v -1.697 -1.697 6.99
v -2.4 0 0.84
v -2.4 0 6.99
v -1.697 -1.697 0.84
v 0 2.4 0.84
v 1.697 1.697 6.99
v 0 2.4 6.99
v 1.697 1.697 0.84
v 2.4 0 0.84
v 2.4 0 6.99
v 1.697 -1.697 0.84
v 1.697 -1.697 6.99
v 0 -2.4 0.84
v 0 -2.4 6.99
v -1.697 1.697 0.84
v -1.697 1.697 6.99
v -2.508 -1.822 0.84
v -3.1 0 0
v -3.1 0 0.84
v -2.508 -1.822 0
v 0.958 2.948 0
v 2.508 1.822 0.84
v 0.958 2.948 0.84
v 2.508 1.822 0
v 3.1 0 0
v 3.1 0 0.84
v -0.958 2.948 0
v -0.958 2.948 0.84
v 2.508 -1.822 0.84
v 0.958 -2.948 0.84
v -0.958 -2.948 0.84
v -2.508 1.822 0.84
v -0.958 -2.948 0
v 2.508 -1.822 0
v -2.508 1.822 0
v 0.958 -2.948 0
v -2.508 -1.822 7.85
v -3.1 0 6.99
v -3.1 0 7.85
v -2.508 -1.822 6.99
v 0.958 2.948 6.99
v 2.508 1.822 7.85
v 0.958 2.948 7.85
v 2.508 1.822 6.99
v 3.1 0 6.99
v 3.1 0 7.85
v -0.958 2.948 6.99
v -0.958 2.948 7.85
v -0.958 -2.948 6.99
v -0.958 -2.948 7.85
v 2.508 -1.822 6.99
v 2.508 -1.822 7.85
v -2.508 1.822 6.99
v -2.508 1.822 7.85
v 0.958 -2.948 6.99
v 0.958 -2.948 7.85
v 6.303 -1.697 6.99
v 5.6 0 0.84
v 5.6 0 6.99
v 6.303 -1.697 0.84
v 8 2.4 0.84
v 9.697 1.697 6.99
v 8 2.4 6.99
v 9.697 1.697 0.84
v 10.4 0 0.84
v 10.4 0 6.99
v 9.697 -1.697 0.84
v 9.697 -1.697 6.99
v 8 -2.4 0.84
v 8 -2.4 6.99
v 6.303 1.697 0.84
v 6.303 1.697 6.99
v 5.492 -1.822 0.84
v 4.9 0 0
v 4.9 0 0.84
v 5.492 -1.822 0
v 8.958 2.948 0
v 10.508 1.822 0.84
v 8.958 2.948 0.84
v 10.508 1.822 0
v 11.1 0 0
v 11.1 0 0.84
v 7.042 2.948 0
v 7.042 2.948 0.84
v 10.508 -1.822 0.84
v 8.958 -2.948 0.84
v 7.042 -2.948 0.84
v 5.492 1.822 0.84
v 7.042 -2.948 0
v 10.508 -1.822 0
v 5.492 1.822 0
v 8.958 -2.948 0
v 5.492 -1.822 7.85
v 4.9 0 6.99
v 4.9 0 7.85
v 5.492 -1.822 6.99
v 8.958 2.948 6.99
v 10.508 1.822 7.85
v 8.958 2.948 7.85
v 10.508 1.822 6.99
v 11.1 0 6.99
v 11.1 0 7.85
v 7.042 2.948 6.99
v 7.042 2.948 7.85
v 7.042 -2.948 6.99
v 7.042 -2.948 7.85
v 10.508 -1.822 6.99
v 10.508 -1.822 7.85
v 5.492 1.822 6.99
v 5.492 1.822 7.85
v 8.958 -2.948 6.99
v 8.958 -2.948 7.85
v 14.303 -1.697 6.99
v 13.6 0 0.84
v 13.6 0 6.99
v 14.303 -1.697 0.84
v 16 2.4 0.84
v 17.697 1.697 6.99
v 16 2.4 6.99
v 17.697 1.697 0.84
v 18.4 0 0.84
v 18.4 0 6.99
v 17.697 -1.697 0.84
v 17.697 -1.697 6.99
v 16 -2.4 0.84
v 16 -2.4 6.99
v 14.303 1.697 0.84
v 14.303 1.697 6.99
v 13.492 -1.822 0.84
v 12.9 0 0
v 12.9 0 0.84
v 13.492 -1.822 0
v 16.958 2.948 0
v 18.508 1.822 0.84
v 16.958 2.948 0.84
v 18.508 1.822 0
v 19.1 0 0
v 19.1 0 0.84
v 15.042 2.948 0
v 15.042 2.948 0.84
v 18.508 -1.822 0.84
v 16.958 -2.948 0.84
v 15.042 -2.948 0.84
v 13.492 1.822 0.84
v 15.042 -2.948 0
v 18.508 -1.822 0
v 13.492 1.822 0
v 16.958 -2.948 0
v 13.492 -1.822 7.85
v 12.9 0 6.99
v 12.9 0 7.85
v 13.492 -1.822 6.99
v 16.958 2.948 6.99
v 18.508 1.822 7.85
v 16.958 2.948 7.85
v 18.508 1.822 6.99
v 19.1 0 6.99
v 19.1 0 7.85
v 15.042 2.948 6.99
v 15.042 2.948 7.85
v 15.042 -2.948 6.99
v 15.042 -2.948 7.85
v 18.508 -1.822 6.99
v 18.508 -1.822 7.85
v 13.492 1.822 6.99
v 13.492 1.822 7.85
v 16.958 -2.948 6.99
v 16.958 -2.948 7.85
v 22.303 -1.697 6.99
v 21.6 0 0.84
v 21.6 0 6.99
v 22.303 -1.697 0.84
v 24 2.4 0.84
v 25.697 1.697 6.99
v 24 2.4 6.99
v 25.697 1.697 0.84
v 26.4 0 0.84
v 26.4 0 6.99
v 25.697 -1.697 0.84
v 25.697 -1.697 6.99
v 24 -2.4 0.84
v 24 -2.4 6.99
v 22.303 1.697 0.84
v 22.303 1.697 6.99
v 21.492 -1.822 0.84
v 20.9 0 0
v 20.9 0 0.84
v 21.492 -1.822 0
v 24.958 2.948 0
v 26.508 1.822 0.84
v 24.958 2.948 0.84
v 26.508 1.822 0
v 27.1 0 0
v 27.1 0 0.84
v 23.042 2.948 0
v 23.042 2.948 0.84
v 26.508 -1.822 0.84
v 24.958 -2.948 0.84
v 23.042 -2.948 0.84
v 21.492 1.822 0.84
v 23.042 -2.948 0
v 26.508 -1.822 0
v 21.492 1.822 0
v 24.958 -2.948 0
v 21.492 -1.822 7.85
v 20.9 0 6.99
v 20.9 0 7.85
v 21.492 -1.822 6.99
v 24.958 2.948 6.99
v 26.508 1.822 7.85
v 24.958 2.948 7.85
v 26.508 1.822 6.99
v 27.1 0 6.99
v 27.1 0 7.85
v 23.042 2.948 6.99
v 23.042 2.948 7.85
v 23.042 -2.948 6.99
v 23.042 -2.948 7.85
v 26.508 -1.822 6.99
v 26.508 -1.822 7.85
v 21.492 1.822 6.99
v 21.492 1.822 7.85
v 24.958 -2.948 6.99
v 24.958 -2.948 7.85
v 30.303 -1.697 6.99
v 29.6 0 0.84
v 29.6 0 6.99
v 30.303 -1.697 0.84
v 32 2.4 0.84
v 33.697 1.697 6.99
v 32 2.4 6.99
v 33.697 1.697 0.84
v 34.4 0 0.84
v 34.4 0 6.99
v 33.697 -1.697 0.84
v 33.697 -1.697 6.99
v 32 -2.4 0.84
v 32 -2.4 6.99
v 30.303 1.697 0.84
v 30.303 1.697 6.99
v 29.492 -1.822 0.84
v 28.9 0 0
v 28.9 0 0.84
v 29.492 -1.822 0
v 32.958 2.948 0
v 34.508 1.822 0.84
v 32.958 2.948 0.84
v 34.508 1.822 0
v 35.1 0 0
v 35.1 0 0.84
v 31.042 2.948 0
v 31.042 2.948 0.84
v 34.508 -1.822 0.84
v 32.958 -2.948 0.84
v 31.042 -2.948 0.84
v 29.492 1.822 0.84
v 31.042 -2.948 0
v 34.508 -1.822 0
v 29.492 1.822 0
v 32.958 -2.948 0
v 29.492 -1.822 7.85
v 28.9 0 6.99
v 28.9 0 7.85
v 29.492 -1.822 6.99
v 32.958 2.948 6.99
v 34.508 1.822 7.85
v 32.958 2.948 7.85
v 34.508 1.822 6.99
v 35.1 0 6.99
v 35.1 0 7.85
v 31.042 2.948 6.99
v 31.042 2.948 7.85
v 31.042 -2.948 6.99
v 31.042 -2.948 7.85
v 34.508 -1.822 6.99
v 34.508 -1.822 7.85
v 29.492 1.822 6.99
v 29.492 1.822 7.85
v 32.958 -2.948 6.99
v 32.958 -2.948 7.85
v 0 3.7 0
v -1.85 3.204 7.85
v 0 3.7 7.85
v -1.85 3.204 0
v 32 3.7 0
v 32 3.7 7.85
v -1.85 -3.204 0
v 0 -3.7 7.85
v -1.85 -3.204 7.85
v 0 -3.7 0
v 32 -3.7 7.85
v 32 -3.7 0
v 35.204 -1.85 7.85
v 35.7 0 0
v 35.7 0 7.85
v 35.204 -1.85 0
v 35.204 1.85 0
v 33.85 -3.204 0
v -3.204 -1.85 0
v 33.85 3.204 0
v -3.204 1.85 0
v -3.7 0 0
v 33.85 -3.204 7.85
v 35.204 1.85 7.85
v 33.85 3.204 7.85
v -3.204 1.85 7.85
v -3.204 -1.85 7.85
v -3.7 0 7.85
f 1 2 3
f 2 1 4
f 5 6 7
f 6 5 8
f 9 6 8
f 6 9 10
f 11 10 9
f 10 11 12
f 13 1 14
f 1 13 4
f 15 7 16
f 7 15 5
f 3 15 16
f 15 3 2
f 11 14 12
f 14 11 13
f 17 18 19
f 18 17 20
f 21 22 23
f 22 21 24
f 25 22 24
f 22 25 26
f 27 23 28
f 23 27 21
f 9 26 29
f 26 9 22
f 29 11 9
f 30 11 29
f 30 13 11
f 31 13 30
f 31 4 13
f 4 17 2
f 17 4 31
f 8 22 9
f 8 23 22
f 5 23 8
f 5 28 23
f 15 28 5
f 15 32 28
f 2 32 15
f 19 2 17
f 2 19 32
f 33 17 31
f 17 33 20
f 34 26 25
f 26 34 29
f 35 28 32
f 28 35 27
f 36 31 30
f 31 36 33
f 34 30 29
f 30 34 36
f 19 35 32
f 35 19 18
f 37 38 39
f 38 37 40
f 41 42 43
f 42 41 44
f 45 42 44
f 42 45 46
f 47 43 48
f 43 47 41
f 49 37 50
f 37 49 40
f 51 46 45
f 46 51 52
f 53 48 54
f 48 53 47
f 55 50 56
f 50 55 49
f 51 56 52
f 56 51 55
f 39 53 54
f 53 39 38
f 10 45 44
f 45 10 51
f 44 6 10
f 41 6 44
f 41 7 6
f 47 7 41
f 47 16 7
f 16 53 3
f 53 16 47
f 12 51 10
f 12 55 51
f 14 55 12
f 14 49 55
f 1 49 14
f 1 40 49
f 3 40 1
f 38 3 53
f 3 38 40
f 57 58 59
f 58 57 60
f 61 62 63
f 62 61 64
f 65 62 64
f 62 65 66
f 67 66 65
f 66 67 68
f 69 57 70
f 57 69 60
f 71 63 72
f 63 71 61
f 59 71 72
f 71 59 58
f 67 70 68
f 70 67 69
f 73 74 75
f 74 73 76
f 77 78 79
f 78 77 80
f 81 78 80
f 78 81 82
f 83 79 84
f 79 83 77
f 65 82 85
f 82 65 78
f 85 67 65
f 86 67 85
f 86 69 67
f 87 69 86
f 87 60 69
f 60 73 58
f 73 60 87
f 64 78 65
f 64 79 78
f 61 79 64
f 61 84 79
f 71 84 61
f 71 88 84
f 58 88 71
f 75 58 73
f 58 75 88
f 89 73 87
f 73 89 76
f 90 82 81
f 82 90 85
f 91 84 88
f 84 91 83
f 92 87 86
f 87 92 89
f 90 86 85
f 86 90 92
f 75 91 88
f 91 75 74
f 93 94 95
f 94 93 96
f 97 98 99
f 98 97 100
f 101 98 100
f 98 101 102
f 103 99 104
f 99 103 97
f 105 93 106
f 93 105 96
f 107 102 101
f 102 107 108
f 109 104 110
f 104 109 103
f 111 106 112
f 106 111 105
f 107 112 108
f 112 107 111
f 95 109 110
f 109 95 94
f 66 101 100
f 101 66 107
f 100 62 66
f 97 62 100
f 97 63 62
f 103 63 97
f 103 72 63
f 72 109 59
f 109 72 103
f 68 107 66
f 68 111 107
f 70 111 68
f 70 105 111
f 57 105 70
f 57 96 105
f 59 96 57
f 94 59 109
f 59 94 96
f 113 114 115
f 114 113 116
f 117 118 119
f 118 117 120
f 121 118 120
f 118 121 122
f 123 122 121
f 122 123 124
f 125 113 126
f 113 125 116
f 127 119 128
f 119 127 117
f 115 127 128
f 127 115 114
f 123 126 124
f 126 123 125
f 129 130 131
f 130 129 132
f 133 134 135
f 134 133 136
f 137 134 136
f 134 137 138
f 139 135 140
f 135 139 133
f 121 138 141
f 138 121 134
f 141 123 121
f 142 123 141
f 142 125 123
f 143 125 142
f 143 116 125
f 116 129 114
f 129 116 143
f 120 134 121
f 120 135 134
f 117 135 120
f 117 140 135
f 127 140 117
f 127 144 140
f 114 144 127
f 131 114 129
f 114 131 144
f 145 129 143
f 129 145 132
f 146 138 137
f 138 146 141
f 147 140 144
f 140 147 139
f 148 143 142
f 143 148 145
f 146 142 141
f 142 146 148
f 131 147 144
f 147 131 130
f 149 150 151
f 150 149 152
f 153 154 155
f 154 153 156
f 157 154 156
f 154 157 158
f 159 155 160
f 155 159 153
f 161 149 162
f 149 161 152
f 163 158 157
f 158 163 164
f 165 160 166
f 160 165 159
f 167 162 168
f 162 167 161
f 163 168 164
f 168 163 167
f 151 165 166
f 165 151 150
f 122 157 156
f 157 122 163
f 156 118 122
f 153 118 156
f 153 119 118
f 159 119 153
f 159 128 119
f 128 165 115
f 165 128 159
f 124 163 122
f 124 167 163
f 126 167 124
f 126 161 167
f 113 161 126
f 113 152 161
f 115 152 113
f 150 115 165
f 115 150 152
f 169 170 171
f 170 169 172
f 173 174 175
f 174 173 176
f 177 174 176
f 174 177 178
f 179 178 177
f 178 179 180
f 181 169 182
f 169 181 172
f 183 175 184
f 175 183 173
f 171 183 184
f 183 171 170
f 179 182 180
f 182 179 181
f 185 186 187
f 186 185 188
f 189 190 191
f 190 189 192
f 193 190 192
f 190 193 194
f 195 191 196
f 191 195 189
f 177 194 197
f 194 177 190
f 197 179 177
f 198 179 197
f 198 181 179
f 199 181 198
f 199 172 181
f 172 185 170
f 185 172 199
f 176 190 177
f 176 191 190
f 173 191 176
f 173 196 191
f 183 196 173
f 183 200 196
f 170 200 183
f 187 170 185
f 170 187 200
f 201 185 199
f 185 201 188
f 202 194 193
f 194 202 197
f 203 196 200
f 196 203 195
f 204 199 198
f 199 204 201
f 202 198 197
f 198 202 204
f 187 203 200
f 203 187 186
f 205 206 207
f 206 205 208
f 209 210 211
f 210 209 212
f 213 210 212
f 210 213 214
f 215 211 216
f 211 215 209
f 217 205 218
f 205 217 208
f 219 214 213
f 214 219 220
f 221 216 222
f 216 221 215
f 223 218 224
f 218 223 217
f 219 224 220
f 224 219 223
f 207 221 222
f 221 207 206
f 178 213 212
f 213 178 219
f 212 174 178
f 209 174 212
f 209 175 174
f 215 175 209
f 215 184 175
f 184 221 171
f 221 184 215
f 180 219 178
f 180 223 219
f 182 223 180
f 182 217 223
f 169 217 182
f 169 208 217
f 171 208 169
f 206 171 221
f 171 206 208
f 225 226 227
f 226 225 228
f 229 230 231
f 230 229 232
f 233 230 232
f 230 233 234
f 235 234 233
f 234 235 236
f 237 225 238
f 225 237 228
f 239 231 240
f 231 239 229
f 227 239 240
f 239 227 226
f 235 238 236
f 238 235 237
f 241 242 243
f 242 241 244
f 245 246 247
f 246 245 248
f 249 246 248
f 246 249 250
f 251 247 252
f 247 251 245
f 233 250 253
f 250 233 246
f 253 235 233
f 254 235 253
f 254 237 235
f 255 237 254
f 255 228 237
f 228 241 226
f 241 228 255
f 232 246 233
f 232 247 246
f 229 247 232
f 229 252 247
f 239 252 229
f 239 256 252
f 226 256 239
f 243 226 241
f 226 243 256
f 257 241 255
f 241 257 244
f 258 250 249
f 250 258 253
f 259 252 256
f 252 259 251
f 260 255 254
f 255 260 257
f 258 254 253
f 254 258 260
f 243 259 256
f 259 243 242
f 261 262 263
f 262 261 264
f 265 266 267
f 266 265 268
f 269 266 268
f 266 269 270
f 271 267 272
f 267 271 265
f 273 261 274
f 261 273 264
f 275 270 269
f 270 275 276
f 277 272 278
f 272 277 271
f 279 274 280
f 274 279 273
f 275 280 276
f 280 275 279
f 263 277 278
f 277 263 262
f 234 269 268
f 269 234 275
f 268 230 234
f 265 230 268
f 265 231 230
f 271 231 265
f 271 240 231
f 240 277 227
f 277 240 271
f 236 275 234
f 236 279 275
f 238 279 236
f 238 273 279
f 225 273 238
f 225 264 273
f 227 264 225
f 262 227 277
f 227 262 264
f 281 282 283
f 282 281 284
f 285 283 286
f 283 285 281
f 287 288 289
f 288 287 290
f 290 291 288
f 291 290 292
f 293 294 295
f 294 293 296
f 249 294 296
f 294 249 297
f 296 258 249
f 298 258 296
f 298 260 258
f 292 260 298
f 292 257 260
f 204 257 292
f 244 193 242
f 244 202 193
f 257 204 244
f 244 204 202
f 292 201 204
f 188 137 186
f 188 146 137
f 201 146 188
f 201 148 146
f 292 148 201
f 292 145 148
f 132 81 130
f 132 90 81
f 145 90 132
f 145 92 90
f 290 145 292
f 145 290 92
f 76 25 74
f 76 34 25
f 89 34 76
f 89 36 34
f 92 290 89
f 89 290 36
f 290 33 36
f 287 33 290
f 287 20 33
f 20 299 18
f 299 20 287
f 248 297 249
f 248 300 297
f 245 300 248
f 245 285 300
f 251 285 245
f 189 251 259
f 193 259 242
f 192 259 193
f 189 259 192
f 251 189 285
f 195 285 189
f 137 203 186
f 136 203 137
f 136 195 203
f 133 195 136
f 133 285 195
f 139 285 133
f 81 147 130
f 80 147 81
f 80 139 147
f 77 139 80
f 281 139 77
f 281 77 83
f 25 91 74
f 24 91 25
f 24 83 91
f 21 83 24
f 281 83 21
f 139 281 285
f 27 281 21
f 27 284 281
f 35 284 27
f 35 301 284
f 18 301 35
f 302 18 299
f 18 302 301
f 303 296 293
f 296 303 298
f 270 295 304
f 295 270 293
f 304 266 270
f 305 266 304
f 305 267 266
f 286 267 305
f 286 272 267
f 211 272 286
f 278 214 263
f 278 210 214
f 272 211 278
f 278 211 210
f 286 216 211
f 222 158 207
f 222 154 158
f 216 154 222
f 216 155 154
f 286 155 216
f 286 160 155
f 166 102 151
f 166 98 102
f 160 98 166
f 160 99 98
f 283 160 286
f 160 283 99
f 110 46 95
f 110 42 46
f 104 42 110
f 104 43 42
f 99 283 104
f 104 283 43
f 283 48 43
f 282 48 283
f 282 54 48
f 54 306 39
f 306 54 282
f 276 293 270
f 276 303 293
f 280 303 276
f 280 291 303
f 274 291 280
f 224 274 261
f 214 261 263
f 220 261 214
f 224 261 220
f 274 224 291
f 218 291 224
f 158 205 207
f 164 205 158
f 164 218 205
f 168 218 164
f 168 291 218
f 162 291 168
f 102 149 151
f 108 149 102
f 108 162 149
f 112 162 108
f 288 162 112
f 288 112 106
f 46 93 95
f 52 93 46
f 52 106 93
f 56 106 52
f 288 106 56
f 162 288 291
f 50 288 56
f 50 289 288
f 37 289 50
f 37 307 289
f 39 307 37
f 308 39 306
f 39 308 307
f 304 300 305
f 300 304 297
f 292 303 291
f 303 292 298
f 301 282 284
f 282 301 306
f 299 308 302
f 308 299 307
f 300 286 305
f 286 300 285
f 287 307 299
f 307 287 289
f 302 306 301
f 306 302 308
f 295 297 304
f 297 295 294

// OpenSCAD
module liftarm_loch ()
{
  t   = 7.85; // Tiefe des Liftarms
  D   = 4.8;  // Durchmesser Loch
  D_a = 6.2;
  t_a = 0.85;

  j = 0.1;   // jiffy 

  cylinder (h = t, d = D);

  translate ([0, 0, -j])
    cylinder (h = t_a + j, d = D_a);

  translate ([0, 0, t - t_a])
    cylinder (h = t_a + j, d = D_a);
}

module liftarm (n = 9)
{
  t   = 7.85;
  w   = 7.4;
  D   = 4.8;
  D_a = 6.2;
  b   = 8.0;  // Abstand Löcher

  difference()
  {
    hull()
      {
        cylinder(h = t, d = w);    
        translate ([(n-1)*b, 0, 0])
          cylinder(h = t, d = w);
      }
    for (k = [0: (n-1)])
      translate ([k * b, 0, -0.01])
        liftarm_loch ();
  }


}

liftarm (5);
